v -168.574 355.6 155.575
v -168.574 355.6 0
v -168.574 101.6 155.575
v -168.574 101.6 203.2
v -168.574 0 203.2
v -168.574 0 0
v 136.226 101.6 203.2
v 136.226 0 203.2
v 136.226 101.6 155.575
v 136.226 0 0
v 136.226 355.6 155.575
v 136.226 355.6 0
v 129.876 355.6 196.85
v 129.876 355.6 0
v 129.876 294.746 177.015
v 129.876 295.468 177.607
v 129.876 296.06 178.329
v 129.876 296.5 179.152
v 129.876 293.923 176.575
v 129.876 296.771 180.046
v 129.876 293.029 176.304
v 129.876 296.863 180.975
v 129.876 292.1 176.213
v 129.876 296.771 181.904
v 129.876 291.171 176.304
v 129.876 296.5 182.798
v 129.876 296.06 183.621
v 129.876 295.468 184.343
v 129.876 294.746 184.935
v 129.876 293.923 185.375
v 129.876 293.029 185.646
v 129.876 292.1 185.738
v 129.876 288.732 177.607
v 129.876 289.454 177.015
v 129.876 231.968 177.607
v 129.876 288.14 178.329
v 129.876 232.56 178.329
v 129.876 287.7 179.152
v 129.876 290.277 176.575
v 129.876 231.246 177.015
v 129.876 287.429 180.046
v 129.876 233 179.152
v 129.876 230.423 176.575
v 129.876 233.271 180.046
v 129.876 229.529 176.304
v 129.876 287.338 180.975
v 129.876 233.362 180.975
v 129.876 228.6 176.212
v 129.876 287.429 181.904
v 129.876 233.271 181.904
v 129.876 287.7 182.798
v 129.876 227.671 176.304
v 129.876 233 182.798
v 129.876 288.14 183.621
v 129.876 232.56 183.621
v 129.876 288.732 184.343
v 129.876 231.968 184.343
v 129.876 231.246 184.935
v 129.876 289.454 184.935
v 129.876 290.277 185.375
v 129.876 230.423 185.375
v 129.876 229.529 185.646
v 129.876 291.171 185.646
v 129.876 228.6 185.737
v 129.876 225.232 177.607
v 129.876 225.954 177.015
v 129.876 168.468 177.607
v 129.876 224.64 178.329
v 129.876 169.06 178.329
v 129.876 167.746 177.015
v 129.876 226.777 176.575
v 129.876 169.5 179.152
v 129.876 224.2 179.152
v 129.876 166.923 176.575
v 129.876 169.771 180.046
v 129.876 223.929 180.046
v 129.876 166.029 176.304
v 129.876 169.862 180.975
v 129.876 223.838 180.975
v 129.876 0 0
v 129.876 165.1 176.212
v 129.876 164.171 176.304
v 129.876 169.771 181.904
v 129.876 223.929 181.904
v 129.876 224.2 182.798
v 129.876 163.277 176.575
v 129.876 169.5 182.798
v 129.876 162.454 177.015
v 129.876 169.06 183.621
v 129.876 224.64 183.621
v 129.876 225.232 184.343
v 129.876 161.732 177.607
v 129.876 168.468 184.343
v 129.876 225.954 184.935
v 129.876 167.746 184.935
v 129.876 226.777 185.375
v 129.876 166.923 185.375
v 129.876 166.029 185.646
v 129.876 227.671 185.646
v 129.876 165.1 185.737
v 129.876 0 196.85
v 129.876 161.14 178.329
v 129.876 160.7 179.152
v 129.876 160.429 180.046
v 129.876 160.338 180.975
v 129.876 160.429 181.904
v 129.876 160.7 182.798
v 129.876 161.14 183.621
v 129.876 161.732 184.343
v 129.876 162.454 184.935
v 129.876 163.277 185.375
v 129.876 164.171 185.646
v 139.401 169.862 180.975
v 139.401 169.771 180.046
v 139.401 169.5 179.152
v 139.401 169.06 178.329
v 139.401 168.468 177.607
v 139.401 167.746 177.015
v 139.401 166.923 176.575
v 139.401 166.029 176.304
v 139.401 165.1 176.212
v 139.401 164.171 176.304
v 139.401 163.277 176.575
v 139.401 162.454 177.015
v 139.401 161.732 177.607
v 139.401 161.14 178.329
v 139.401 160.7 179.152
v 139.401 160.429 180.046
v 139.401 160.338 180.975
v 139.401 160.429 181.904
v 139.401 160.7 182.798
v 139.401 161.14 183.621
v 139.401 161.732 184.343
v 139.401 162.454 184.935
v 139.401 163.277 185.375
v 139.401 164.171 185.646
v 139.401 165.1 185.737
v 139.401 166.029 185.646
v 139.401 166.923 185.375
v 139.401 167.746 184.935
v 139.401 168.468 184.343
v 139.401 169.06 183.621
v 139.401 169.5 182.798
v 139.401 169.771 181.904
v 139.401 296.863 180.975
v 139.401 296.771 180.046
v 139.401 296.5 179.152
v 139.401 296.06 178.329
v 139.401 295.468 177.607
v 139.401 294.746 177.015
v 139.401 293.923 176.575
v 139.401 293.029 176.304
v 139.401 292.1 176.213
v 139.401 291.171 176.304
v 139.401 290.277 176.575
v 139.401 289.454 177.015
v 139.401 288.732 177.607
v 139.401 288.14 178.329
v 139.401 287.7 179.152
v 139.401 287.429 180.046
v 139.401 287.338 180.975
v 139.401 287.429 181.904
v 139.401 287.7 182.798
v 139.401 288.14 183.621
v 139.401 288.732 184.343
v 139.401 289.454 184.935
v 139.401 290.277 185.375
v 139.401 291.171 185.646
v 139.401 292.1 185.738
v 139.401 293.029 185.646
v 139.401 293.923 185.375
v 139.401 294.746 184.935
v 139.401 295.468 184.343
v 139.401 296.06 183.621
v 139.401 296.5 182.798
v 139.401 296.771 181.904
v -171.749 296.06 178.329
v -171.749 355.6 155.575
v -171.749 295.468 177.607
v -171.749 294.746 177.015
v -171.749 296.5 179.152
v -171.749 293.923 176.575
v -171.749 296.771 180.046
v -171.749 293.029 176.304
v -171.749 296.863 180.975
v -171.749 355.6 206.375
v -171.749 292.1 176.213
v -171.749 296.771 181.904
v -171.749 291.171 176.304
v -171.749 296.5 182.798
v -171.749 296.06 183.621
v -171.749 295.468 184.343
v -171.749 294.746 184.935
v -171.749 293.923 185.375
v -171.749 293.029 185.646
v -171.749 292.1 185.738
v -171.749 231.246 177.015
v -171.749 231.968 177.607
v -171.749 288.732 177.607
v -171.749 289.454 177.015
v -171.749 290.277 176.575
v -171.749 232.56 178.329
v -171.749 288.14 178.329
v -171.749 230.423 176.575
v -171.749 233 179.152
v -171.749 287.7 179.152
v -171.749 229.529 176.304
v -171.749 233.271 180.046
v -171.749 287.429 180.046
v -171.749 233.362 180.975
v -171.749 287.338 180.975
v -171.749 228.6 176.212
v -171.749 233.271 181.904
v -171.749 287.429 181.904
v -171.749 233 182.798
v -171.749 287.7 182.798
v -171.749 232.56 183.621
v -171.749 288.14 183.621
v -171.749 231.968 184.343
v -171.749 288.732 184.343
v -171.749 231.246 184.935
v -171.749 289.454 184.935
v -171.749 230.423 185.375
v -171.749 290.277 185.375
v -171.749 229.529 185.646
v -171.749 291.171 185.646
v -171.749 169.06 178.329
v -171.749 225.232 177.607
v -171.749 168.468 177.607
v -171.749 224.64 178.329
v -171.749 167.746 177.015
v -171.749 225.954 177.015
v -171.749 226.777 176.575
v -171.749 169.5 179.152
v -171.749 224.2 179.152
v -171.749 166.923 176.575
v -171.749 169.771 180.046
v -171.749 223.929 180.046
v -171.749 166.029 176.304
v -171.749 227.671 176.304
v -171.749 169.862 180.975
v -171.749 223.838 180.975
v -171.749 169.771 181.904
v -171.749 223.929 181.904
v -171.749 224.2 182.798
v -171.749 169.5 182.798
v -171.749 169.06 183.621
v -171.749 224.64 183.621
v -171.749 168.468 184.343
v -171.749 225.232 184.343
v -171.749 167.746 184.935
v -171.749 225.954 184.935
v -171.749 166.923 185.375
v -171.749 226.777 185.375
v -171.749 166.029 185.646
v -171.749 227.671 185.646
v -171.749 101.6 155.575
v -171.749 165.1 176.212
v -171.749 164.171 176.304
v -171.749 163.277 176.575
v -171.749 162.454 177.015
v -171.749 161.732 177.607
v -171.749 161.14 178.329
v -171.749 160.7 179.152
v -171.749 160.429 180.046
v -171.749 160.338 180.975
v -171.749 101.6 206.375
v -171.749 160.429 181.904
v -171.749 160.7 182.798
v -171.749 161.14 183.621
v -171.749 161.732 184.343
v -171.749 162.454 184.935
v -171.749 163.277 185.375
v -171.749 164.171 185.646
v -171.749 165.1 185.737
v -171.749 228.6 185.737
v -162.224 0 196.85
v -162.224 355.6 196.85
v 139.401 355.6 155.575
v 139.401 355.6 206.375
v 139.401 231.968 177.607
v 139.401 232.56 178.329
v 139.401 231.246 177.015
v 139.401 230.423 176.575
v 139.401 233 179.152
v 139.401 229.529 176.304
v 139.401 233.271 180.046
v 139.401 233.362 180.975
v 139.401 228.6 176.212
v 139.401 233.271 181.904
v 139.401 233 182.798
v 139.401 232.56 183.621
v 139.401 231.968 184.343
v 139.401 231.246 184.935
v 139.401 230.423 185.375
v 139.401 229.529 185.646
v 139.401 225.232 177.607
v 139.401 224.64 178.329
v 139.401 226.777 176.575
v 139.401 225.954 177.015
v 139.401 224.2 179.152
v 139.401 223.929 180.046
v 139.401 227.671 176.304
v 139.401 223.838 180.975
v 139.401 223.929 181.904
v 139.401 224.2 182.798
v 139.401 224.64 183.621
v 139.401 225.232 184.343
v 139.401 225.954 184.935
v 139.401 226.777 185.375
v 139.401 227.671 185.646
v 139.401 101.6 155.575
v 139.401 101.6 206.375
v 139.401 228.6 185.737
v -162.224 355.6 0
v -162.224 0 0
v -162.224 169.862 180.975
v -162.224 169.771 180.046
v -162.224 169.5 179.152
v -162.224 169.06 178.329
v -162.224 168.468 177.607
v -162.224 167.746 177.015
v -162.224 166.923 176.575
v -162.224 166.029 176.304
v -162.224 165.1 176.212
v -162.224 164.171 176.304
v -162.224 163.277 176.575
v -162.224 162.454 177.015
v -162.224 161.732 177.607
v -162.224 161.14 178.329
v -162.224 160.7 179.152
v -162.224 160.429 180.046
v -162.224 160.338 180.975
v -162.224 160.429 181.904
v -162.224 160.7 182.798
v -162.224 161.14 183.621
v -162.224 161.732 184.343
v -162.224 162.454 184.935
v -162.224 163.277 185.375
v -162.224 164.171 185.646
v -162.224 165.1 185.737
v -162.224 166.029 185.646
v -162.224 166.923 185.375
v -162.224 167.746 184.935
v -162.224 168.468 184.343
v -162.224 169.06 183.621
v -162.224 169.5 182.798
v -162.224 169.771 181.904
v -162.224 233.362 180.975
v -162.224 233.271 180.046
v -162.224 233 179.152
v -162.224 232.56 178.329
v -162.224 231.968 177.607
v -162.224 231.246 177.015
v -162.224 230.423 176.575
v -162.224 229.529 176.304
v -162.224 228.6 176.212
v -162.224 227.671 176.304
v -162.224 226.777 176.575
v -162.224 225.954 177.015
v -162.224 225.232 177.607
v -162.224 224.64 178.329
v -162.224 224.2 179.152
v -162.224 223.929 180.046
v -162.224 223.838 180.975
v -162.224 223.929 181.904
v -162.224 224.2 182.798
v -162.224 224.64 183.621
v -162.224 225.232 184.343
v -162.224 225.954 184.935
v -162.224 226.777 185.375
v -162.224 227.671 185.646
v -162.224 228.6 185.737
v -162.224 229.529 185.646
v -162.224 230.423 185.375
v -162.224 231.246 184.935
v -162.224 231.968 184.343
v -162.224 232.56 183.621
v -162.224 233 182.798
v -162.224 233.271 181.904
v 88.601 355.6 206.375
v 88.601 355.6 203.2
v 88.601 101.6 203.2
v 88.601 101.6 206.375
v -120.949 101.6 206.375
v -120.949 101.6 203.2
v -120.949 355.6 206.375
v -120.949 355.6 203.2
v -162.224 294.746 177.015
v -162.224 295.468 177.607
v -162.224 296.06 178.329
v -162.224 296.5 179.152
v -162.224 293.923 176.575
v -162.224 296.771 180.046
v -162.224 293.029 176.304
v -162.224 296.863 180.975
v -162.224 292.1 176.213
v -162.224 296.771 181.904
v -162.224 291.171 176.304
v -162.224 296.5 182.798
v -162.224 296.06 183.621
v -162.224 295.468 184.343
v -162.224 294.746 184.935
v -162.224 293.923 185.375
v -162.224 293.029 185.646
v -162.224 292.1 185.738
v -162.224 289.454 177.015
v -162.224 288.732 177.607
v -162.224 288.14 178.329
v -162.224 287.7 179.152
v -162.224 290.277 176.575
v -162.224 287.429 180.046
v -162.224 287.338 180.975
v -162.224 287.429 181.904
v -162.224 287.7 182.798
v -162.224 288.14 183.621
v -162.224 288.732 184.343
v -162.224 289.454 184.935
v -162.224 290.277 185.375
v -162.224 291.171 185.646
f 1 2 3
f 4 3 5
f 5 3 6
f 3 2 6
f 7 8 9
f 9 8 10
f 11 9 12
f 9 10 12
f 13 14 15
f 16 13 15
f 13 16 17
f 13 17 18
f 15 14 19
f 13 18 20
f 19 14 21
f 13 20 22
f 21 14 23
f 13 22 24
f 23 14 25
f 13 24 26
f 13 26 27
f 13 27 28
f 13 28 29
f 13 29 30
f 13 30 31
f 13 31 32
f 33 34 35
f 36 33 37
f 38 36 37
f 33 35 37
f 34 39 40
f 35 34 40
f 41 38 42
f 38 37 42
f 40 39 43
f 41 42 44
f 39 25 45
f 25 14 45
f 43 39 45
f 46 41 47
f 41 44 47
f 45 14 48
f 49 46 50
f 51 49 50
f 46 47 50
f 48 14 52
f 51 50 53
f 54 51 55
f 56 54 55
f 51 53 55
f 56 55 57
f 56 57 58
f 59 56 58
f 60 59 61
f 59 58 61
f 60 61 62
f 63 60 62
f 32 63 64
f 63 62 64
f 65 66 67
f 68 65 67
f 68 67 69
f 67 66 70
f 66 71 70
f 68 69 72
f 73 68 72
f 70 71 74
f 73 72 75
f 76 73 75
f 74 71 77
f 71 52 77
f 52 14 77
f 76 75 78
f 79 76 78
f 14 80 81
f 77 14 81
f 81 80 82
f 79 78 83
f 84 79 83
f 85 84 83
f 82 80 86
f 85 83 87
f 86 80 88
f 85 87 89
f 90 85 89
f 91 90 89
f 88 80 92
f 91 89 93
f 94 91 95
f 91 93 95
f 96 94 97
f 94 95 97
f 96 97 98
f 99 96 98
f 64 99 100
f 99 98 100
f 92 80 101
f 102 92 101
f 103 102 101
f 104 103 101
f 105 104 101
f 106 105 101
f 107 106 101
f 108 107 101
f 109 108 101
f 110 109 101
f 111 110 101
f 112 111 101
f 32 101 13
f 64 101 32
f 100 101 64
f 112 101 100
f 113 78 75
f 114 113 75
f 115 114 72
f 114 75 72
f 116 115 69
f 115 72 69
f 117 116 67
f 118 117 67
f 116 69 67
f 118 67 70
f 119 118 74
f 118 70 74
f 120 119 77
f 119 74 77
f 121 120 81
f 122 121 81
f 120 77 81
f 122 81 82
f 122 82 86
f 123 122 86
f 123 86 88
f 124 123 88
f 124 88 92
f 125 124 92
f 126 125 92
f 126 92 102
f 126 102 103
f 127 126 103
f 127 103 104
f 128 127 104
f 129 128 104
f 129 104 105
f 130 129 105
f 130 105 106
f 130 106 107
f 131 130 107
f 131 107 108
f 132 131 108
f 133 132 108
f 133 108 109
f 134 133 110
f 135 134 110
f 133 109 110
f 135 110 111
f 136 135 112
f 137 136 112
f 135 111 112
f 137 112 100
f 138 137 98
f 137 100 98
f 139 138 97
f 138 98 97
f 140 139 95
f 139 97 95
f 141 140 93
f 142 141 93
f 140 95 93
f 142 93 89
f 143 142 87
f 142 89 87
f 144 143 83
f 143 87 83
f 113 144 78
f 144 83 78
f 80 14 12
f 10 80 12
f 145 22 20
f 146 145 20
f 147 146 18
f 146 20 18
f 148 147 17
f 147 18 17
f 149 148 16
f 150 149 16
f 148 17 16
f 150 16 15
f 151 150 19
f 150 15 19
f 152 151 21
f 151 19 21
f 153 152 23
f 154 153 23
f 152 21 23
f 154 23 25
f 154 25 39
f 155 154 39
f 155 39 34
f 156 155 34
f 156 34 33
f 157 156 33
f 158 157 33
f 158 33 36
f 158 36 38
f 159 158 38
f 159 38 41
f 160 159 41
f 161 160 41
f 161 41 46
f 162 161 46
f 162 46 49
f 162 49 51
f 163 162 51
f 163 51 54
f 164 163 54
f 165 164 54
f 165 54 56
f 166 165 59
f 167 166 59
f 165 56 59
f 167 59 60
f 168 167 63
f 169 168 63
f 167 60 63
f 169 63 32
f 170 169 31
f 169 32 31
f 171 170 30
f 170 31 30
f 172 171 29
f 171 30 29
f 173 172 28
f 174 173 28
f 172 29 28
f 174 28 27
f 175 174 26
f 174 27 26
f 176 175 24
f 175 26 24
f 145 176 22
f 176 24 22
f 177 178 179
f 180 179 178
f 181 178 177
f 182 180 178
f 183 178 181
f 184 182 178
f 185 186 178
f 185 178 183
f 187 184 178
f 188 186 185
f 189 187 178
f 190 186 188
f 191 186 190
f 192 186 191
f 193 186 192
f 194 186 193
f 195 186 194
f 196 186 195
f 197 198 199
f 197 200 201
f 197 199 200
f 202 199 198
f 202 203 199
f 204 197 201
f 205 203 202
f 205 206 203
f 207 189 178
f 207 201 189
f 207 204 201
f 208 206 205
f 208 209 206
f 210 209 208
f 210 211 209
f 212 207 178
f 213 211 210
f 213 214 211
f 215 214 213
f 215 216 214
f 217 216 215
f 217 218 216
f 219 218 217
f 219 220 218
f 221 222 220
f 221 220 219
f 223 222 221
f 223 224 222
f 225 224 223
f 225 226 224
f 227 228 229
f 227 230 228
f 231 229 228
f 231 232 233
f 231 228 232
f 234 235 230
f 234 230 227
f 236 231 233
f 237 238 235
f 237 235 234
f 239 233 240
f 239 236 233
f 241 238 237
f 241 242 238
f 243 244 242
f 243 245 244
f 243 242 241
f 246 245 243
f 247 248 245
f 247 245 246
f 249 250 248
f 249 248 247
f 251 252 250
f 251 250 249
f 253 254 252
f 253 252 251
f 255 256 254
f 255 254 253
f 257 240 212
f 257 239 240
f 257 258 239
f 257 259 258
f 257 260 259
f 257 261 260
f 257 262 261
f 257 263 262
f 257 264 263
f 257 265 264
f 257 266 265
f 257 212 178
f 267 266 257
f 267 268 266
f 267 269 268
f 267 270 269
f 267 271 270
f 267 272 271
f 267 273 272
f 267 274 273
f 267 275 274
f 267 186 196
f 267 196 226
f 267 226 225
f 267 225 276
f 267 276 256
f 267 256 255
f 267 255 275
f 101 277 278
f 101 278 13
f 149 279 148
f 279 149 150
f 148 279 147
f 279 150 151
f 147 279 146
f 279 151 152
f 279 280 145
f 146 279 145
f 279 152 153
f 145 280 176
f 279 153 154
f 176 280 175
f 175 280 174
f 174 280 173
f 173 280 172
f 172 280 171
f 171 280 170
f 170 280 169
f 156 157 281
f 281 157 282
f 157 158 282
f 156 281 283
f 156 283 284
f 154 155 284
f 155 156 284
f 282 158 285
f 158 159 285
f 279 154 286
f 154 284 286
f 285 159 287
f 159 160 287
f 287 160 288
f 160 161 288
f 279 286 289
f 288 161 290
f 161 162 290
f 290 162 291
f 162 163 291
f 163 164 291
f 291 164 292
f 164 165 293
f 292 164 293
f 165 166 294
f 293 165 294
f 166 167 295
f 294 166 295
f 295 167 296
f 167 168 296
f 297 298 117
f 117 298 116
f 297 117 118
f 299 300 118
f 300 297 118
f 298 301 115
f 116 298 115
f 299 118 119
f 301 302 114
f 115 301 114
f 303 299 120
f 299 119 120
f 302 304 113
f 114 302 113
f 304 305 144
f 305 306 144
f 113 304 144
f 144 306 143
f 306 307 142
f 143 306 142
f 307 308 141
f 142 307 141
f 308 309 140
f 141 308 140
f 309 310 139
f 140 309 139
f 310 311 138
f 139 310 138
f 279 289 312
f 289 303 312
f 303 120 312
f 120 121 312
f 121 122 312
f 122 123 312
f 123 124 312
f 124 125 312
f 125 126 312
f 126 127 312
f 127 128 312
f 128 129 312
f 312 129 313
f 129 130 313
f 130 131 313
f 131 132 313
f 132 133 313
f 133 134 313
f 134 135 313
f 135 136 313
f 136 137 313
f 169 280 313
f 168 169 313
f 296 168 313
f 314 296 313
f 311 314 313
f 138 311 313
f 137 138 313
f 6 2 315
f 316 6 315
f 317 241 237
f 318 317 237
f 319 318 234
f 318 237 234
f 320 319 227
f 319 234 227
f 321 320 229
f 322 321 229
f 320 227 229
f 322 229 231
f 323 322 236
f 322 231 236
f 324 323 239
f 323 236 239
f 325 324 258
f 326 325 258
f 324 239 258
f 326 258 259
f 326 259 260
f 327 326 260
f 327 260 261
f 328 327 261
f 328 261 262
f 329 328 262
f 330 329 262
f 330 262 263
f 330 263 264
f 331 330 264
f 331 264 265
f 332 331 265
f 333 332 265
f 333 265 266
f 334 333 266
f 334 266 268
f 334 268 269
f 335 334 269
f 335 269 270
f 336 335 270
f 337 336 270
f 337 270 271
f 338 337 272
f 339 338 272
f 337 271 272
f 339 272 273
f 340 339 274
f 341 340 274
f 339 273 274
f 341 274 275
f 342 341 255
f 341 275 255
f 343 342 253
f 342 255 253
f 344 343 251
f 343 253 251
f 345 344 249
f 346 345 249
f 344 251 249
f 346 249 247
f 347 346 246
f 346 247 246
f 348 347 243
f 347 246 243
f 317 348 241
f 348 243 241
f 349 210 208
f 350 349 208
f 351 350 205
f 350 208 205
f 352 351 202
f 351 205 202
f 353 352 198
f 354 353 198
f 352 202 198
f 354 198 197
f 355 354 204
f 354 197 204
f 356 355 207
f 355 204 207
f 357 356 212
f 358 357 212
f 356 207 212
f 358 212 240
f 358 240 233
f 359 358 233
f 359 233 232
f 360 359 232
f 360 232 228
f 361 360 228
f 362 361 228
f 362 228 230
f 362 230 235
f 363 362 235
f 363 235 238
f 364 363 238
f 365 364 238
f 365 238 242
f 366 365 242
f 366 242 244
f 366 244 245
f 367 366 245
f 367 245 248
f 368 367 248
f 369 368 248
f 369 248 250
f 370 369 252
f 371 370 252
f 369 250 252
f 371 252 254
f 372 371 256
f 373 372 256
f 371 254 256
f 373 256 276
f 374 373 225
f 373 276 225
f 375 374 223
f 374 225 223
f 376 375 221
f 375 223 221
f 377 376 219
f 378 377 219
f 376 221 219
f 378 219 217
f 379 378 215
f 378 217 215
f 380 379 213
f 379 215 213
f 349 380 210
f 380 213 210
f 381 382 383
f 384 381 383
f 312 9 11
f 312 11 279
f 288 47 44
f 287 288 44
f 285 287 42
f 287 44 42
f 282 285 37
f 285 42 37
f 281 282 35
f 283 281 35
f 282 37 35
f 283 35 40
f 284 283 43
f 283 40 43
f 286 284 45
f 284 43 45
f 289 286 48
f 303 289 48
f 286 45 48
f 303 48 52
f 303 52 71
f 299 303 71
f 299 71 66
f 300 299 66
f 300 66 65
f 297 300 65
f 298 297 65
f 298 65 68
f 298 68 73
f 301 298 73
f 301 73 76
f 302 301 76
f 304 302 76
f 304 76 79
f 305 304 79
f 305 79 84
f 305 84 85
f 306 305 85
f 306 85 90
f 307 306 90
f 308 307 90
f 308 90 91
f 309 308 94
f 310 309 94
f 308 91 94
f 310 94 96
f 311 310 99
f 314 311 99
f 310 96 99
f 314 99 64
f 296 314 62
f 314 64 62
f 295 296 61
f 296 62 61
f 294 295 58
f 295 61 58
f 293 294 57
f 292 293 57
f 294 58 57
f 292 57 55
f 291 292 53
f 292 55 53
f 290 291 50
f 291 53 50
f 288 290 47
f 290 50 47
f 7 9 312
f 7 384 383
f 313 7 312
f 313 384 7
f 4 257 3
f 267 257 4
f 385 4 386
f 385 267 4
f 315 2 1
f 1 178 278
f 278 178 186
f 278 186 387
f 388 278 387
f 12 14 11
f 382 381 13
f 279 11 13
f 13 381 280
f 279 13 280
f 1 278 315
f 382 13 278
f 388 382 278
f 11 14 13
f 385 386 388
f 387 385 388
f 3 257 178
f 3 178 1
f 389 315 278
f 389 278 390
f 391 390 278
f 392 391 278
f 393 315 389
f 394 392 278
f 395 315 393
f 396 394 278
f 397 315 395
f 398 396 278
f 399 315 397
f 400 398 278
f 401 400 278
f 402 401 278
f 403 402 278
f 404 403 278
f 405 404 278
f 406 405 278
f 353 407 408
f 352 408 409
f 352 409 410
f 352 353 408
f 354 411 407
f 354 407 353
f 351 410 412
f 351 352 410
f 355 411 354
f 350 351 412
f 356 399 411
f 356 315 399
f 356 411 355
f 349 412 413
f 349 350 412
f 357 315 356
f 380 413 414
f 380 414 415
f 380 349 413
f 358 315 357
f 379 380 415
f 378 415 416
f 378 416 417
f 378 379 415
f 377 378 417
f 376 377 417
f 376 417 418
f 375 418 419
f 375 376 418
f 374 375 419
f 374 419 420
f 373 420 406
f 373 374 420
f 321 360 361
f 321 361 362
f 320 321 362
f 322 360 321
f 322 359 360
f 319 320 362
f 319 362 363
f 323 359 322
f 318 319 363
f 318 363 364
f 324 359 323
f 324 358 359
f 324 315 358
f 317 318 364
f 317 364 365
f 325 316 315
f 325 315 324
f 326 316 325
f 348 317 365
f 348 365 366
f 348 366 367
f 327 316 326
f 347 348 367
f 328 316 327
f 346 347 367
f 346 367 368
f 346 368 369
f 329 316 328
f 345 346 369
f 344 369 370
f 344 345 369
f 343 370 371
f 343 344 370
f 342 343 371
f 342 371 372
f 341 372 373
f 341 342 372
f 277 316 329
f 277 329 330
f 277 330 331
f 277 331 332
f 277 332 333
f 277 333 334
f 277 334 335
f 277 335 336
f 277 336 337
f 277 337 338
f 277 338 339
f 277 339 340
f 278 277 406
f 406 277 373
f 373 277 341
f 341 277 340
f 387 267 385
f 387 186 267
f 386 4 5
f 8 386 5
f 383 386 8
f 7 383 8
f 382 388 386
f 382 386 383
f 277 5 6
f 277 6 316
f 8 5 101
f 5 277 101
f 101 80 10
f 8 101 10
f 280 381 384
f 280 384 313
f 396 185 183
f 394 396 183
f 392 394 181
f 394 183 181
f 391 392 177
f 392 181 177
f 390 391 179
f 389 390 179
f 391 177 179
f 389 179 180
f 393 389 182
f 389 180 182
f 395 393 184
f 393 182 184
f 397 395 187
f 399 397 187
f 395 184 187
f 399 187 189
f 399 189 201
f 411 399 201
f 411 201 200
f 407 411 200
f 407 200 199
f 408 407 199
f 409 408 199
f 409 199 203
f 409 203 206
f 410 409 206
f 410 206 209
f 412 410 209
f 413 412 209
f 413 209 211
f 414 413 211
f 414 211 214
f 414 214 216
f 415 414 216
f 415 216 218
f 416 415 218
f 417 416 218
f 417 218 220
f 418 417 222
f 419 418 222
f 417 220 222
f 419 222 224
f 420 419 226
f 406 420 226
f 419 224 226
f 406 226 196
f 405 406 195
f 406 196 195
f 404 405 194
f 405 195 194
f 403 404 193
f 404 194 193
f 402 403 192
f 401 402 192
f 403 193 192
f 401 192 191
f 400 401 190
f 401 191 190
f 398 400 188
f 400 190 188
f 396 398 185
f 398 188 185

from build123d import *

# Parameters (mm, degrees)
F1_DEPTH  = 203.2
F2_T      = -6.35
F4_DEPTH  = 3.175
F5_W      = 292.1
F5_H      = 196.85
F6_DEPTH  = 640.08
F7_W      = 3.175
F7_H      = 254
F8_DEPTH  = 47.625
F10_W     = 3.175
F10_H     = 254
F11_DEPTH = 47.625
F12_DEPTH = 311.151


with BuildPart() as f1:
    # F0 (on Top) → F1 (new body)
    with BuildSketch(Plane.XY):
        Polygon((-168.573773, 0), (0, 0), (136.226227, 0), (136.226227, 355.6), (-168.573773, 355.6), align=None)
    extrude(amount=F1_DEPTH)

    # F2
    f2_openings = [f1.faces().sort_by_distance(p)[0] for p in [
        (-16.173773, 177.8, 0),
    ]]
    offset(amount=F2_T, openings=f2_openings)

    # F3 (on face) → F4 (join)
    with BuildSketch(Plane.XY.offset(203.2)):
        Polygon((-171.748773, 101.6), (-168.573773, 101.6), (-120.948773, 101.6), (-120.948773, 355.6), (-168.573773, 355.6), (-171.748773, 355.6), align=None)
        Polygon((139.401227, 355.6), (136.226227, 355.6), (88.601227, 355.6), (88.601227, 101.6), (136.226227, 101.6), (139.401227, 101.6), align=None)
    extrude(amount=F4_DEPTH)

    # F5 (on face) → F6 (cut)
    with BuildSketch(Plane.XZ):
        with Locations((-16.173773, 98.425)):
            Rectangle(F5_W, F5_H)
    extrude(amount=-F6_DEPTH, mode=Mode.SUBTRACT)

    # F7 (on face) → F8 (join)
    with BuildSketch(Plane(origin=(0, 0, 203.2), x_dir=(1, 0, 0), z_dir=(0, 0, -1))):
        with Locations((-170.161273, -228.6)):
            Rectangle(F7_W, F7_H)
    extrude(amount=F8_DEPTH)

    # F10 (on face) → F11 (join)
    with BuildSketch(Plane(origin=(0, 0, 203.2), x_dir=(1, 0, 0), z_dir=(0, 0, -1))):
        with Locations((137.813727, -228.6)):
            Rectangle(F10_W, F10_H)
    extrude(amount=F11_DEPTH)

    # F9 (on face) → F12 (cut, through all)
    with BuildSketch(Plane(origin=(-171.748773, 0, 0), x_dir=(0, -1, 0), z_dir=(-1, 0, 0))):
        with BuildLine():
            ThreePointArc((-287.3375, 180.975), (-292.1, 185.7375), (-296.8625, 180.975))
            Line((-296.8625, 180.975), (-287.3375, 180.975))
        make_face()
        with BuildLine():
            ThreePointArc((-160.3375, 180.975), (-165.1, 185.7375), (-169.8625, 180.975))
            Line((-169.8625, 180.975), (-160.3375, 180.975))
        make_face()
        with BuildLine():
            Line((-160.3375, 180.975), (-169.8625, 180.975))
            ThreePointArc((-169.8625, 180.975), (-165.1, 176.2125), (-160.3375, 180.975))
        make_face()
        with BuildLine():
            ThreePointArc((-223.8375, 180.975), (-228.6, 185.7375), (-233.3625, 180.975))
            Line((-233.3625, 180.975), (-223.8375, 180.975))
        make_face()
        with BuildLine():
            Line((-223.8375, 180.975), (-233.3625, 180.975))
            ThreePointArc((-233.3625, 180.975), (-228.6, 176.2125), (-223.8375, 180.975))
        make_face()
        with BuildLine():
            Line((-287.3375, 180.975), (-296.8625, 180.975))
            ThreePointArc((-296.8625, 180.975), (-292.1, 176.2125), (-287.3375, 180.975))
        make_face()
    extrude(amount=-F12_DEPTH, mode=Mode.SUBTRACT)


solid = f1.part
